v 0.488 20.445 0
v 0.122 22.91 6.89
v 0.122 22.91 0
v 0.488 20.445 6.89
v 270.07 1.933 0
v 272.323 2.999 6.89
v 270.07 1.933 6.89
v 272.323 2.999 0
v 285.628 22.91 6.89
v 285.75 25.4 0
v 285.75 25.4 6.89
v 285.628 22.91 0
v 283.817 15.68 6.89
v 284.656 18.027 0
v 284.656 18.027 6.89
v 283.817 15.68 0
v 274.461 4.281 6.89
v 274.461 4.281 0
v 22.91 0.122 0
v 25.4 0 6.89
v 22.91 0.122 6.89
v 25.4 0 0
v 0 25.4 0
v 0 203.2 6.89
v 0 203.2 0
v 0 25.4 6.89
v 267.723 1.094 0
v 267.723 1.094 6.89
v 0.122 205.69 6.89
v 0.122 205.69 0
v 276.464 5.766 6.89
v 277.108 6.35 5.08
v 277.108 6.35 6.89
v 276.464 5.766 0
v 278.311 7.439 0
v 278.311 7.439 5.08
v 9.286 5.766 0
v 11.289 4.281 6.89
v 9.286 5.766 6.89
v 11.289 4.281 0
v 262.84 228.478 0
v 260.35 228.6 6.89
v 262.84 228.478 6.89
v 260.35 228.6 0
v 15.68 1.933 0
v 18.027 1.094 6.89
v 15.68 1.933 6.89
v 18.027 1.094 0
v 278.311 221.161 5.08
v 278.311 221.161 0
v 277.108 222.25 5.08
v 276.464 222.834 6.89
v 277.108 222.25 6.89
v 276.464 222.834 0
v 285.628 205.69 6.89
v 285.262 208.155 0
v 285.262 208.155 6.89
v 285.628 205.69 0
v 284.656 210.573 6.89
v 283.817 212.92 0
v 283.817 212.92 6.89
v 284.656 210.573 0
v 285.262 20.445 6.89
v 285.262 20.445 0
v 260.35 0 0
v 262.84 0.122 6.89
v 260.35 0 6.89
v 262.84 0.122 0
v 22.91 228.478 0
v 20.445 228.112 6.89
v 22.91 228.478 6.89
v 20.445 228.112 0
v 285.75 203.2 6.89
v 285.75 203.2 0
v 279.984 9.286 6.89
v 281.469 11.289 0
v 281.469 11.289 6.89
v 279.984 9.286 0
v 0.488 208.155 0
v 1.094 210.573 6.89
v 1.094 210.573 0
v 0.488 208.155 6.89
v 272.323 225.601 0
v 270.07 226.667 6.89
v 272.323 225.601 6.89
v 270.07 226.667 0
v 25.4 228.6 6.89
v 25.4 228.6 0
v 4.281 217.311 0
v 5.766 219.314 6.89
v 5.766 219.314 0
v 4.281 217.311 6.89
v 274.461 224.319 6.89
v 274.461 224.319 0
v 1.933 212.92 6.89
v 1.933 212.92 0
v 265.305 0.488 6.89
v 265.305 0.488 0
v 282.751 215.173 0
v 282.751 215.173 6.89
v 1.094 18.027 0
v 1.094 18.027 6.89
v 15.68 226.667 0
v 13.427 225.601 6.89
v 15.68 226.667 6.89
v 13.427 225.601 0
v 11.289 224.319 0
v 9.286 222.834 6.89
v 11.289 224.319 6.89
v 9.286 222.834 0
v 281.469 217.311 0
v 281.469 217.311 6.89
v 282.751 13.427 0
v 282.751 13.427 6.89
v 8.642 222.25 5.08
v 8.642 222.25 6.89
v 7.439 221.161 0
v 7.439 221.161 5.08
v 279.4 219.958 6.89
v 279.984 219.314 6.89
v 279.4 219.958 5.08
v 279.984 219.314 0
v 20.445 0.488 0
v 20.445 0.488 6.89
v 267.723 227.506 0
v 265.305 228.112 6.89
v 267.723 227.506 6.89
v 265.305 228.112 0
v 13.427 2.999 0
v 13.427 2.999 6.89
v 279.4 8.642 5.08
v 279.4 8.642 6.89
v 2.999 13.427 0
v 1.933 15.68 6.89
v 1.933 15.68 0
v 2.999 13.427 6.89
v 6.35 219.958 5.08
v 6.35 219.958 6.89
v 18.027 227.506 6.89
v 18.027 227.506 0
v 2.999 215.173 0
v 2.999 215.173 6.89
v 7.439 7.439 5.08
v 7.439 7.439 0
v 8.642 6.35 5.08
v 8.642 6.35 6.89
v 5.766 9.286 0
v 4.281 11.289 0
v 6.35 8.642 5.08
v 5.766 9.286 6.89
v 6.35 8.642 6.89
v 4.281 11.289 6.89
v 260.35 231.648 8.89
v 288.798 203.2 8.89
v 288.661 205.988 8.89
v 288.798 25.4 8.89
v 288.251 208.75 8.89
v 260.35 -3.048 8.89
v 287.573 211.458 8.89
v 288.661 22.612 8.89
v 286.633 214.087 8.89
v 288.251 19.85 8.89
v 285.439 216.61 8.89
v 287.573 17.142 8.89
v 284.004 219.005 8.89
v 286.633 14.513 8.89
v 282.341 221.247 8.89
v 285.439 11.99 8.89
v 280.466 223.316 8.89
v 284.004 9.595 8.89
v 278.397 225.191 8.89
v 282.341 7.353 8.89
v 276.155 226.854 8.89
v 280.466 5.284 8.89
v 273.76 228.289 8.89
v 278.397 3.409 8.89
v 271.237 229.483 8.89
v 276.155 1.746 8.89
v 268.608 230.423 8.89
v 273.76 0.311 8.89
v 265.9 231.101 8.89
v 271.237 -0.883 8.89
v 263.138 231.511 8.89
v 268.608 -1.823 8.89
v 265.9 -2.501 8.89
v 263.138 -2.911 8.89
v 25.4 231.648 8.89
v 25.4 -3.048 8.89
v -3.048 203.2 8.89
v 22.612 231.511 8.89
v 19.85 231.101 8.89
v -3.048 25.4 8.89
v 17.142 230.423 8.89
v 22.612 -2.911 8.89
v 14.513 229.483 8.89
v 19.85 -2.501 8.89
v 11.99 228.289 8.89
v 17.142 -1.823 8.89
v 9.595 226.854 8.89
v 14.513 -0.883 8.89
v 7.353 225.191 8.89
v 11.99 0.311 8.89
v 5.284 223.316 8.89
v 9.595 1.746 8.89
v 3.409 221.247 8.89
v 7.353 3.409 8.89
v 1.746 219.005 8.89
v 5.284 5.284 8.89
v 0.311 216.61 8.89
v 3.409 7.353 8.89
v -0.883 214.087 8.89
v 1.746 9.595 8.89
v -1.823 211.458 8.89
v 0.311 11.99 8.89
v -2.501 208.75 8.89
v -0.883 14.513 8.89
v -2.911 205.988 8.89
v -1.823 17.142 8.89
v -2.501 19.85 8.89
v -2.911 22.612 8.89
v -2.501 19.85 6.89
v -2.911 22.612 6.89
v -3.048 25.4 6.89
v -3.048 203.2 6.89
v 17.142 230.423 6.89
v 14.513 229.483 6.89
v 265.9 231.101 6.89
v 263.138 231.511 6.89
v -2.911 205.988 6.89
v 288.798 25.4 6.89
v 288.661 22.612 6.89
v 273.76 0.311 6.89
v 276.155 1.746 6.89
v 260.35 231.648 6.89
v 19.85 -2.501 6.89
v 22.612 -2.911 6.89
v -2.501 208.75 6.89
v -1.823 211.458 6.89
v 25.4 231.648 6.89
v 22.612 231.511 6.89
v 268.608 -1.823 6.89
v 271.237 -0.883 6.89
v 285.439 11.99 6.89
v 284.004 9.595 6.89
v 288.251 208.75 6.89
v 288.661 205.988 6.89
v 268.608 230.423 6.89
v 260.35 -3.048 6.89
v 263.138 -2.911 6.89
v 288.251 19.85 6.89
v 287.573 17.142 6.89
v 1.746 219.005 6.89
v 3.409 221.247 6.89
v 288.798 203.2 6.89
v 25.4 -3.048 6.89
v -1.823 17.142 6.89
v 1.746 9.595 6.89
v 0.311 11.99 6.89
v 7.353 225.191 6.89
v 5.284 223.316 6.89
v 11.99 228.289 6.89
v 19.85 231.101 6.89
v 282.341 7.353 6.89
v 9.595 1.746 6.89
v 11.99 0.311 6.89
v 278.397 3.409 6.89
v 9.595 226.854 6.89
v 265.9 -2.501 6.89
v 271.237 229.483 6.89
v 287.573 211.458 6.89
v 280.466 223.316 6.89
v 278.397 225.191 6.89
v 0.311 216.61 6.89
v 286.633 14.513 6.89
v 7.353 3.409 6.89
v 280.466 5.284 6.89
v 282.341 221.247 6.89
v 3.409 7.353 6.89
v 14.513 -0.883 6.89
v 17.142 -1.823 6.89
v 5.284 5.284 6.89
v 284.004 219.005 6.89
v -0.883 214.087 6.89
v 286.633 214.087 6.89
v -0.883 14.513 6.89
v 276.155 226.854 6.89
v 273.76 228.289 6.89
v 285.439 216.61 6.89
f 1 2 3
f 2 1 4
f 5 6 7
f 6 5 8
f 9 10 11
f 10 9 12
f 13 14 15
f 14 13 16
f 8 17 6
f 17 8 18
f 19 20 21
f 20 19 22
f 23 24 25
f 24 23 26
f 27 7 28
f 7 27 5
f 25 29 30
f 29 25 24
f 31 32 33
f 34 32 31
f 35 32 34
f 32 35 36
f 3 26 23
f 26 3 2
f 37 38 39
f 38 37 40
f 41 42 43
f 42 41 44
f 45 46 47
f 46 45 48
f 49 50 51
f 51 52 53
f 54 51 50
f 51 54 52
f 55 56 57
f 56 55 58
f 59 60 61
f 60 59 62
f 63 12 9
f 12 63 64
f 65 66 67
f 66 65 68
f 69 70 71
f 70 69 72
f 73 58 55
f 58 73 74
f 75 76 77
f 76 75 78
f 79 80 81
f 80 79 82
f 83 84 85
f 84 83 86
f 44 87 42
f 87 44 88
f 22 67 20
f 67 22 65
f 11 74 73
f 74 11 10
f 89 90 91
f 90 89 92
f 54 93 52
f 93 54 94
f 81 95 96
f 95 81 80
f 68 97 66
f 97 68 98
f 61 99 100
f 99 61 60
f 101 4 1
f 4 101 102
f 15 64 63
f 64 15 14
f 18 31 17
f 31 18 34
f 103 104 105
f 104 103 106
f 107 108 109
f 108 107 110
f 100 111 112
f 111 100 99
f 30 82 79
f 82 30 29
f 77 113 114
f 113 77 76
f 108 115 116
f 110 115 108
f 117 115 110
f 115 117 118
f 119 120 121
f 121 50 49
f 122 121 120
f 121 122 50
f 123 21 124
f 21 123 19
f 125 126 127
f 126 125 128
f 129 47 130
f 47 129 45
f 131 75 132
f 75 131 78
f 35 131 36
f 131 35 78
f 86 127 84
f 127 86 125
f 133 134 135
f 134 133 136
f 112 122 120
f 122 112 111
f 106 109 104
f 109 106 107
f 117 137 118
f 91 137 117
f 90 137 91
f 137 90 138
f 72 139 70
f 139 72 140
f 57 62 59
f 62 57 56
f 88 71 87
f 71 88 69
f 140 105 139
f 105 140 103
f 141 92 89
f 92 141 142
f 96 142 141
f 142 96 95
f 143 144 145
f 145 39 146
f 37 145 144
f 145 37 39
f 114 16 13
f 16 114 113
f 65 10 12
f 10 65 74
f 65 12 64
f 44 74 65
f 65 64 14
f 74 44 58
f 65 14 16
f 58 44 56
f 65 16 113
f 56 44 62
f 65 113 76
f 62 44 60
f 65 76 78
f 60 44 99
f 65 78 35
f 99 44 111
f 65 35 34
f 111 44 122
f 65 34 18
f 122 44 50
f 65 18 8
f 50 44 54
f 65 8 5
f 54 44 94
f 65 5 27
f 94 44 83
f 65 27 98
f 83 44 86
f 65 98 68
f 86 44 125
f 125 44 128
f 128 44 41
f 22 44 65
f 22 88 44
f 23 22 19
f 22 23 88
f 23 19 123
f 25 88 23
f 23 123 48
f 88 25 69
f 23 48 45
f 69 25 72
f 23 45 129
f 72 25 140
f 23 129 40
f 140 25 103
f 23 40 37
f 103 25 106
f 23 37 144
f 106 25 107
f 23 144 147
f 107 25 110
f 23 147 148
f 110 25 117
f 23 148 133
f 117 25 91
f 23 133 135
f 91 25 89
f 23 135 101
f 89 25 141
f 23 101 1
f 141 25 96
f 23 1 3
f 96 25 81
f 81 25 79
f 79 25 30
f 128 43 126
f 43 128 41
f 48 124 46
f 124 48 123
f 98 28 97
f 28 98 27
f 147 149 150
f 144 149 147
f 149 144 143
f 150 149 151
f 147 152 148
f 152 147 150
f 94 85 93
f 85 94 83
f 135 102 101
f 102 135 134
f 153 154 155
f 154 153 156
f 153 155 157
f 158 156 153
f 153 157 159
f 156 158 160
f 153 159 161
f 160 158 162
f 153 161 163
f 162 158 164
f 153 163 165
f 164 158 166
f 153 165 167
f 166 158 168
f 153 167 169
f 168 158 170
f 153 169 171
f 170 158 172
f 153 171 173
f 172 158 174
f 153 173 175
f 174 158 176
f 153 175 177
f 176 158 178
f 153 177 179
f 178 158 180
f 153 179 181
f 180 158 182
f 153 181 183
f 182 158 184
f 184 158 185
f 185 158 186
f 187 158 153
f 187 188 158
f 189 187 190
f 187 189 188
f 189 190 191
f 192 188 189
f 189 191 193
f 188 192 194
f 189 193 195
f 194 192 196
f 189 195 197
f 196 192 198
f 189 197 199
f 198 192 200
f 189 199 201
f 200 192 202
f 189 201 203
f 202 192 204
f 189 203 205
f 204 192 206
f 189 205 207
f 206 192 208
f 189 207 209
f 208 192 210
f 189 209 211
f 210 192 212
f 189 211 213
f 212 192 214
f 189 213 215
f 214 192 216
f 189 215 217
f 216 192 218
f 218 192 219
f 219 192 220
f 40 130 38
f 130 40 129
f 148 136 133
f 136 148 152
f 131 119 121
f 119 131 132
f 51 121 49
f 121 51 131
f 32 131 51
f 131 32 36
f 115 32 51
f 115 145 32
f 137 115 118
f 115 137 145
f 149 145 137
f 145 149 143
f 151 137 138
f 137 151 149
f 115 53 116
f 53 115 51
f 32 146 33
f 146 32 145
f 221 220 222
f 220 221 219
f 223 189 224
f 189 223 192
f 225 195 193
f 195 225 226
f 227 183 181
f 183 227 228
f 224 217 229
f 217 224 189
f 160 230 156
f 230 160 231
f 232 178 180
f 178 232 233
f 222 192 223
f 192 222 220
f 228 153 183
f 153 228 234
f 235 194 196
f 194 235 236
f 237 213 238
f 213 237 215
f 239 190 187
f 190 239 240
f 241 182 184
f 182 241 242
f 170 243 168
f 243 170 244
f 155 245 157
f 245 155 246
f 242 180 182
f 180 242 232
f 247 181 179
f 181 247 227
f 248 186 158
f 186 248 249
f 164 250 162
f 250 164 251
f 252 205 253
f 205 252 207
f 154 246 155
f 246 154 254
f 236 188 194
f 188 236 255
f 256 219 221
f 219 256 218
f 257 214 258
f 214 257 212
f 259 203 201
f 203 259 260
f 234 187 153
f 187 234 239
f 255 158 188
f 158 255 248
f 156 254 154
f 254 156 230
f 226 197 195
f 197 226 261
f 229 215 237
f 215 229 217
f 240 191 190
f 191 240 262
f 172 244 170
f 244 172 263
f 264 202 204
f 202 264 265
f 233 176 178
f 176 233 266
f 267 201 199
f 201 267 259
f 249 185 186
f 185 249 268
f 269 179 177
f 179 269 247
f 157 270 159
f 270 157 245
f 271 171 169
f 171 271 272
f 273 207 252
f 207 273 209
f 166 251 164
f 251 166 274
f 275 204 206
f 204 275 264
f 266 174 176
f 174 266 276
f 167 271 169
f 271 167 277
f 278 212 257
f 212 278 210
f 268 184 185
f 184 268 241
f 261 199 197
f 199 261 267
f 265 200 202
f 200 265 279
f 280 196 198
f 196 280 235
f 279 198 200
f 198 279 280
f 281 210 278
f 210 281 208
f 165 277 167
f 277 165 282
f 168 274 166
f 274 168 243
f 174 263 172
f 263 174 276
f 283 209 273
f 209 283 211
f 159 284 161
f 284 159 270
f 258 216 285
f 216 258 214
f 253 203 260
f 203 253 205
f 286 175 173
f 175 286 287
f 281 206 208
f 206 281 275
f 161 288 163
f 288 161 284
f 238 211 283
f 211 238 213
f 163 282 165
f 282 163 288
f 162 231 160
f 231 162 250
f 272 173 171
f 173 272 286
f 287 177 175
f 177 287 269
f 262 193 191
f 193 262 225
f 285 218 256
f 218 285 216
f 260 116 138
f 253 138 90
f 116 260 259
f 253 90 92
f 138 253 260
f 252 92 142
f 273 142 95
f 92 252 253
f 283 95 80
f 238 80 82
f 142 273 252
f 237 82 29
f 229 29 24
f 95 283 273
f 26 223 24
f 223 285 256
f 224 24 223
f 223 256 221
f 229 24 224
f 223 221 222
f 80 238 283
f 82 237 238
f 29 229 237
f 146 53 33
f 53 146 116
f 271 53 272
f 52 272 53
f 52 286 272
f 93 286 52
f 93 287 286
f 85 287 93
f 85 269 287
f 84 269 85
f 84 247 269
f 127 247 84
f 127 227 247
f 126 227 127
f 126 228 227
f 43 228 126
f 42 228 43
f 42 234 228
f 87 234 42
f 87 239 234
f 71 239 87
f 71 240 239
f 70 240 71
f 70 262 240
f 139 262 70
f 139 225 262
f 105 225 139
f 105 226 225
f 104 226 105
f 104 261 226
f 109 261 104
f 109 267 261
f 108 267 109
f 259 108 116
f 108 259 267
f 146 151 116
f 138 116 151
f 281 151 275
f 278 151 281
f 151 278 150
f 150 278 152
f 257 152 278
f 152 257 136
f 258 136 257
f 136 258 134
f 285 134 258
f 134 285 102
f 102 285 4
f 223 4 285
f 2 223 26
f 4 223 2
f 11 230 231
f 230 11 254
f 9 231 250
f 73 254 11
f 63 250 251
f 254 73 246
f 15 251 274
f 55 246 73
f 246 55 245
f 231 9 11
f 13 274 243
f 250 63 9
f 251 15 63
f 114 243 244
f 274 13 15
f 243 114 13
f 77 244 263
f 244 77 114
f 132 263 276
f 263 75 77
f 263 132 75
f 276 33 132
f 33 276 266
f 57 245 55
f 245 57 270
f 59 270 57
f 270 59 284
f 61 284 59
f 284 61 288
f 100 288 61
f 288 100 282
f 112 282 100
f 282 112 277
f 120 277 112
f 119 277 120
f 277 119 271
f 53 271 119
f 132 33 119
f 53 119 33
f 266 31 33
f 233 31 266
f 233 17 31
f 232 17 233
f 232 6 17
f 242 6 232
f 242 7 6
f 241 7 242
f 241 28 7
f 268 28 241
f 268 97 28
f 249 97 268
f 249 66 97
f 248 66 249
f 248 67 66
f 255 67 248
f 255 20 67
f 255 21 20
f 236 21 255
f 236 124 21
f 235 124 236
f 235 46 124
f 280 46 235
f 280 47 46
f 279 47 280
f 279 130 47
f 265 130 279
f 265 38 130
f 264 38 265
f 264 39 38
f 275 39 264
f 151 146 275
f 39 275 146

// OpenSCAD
// file: model-forge/tray.scad
// model-forge/tray.scad — rounded-corner outer panel with a recessed
// inset pocket (e.g. a "cooking dish" recess): a raised rim around the
// edge, floor thickness under the pocket, and an optional thin lip
// flange around the base — sized to slide into a support-rail groove
// (like the wooden rails inside the real Tiny Land oven cavity) rather
// than just resting loose.
//
//   use <model-forge/tray.scad>
//   rounded_tray(outer_width=285.75, outer_height=228.6, corner_radius=25.4,
//                floor_thickness=5.08, rim_height=3.81, inset_margin=6.35,
//                lip_width=3, lip_thickness=2);
//
// Shape: outer_width x outer_height slab, rounded corners (corner_radius),
// total height = floor_thickness + rim_height. A pocket is cut from the
// top, inset_margin in from every edge, cutting down through rim_height
// and stopping at floor_thickness from the bottom — so floor_thickness is
// what's left under the pocket, rim_height is how tall the surrounding
// wall stands above the pocket floor.
//
// The lip (lip_width/lip_thickness) is a thin flange at the TOP of the
// rim (from total_height-lip_thickness to total_height), sticking out
// lip_width beyond the main body on every side — corrected 2026-09-11
// per feedback on the real rail photo: the groove is near the top of the
// cavity wall, not the bottom. Both default to 0 (no lip) so existing
// calls keep working unchanged.

// hull-of-4-circles rounded rect — much faster to render than a
// minkowski-based approach for this shape (no minkowski sum needed).
module rounded_rect_2d(w, h, r) {
  hull() {
    translate([r, r]) circle(r = r, $fn = 64);
    translate([w - r, r]) circle(r = r, $fn = 64);
    translate([r, h - r]) circle(r = r, $fn = 64);
    translate([w - r, h - r]) circle(r = r, $fn = 64);
  }
}

module rounded_tray(
  outer_width,
  outer_height,
  corner_radius,
  floor_thickness,
  rim_height,
  inset_margin,
  lip_width = 0,
  lip_thickness = 0
) {
  total_height = floor_thickness + rim_height;

  union() {
    if (lip_width > 0 && lip_thickness > 0) {
      translate([-lip_width, -lip_width, total_height - lip_thickness])
        linear_extrude(height = lip_thickness)
          rounded_rect_2d(outer_width + 2 * lip_width, outer_height + 2 * lip_width, corner_radius + lip_width);
    }
    difference() {
      linear_extrude(height = total_height)
        rounded_rect_2d(outer_width, outer_height, corner_radius);
      translate([inset_margin, inset_margin, floor_thickness])
        cube([outer_width - 2 * inset_margin, outer_height - 2 * inset_margin, rim_height + 1]);
    }
  }
}
// main file
// Tiny Land oven insert — cooking-dish tray. Standalone, printable file:
// swap the variables below, save, and re-export the STL (File > Export >
// Export as STL, or the CLI: openscad -o out.stl oven-tray.scad).
// View > Show Customizer for sliders.
use <model-forge/tray.scad>

/* [Size — inches] */
outer_width_in  = 11.25;
outer_height_in = 9;
corner_radius_in = 1;

/* [Pocket] */
floor_thickness_mm = 5.08; // [1:0.1:15]
rim_height_mm       = 3.81; // [1:0.1:15]
inset_margin_mm      = 6.35; // [1:0.1:25]

/* [Lip — slides into the oven cavity's support-rail groove] */
lip_width_in     = 0.12; // [0:0.01:1]  long (top/bottom) edges
end_lip_width_in = 0.5;  // [0:0.01:1]  short (left/right) edges
lip_thickness_mm = 2;    // [0.5:0.5:5]

IN_TO_MM = 25.4;

rounded_tray(
  outer_width     = outer_width_in * IN_TO_MM,
  outer_height    = outer_height_in * IN_TO_MM,
  corner_radius   = corner_radius_in * IN_TO_MM,
  floor_thickness = floor_thickness_mm,
  rim_height      = rim_height_mm,
  inset_margin    = inset_margin_mm,
  lip_width       = lip_width_in * IN_TO_MM,
  end_lip_width   = end_lip_width_in * IN_TO_MM,
  lip_thickness   = lip_thickness_mm
);
